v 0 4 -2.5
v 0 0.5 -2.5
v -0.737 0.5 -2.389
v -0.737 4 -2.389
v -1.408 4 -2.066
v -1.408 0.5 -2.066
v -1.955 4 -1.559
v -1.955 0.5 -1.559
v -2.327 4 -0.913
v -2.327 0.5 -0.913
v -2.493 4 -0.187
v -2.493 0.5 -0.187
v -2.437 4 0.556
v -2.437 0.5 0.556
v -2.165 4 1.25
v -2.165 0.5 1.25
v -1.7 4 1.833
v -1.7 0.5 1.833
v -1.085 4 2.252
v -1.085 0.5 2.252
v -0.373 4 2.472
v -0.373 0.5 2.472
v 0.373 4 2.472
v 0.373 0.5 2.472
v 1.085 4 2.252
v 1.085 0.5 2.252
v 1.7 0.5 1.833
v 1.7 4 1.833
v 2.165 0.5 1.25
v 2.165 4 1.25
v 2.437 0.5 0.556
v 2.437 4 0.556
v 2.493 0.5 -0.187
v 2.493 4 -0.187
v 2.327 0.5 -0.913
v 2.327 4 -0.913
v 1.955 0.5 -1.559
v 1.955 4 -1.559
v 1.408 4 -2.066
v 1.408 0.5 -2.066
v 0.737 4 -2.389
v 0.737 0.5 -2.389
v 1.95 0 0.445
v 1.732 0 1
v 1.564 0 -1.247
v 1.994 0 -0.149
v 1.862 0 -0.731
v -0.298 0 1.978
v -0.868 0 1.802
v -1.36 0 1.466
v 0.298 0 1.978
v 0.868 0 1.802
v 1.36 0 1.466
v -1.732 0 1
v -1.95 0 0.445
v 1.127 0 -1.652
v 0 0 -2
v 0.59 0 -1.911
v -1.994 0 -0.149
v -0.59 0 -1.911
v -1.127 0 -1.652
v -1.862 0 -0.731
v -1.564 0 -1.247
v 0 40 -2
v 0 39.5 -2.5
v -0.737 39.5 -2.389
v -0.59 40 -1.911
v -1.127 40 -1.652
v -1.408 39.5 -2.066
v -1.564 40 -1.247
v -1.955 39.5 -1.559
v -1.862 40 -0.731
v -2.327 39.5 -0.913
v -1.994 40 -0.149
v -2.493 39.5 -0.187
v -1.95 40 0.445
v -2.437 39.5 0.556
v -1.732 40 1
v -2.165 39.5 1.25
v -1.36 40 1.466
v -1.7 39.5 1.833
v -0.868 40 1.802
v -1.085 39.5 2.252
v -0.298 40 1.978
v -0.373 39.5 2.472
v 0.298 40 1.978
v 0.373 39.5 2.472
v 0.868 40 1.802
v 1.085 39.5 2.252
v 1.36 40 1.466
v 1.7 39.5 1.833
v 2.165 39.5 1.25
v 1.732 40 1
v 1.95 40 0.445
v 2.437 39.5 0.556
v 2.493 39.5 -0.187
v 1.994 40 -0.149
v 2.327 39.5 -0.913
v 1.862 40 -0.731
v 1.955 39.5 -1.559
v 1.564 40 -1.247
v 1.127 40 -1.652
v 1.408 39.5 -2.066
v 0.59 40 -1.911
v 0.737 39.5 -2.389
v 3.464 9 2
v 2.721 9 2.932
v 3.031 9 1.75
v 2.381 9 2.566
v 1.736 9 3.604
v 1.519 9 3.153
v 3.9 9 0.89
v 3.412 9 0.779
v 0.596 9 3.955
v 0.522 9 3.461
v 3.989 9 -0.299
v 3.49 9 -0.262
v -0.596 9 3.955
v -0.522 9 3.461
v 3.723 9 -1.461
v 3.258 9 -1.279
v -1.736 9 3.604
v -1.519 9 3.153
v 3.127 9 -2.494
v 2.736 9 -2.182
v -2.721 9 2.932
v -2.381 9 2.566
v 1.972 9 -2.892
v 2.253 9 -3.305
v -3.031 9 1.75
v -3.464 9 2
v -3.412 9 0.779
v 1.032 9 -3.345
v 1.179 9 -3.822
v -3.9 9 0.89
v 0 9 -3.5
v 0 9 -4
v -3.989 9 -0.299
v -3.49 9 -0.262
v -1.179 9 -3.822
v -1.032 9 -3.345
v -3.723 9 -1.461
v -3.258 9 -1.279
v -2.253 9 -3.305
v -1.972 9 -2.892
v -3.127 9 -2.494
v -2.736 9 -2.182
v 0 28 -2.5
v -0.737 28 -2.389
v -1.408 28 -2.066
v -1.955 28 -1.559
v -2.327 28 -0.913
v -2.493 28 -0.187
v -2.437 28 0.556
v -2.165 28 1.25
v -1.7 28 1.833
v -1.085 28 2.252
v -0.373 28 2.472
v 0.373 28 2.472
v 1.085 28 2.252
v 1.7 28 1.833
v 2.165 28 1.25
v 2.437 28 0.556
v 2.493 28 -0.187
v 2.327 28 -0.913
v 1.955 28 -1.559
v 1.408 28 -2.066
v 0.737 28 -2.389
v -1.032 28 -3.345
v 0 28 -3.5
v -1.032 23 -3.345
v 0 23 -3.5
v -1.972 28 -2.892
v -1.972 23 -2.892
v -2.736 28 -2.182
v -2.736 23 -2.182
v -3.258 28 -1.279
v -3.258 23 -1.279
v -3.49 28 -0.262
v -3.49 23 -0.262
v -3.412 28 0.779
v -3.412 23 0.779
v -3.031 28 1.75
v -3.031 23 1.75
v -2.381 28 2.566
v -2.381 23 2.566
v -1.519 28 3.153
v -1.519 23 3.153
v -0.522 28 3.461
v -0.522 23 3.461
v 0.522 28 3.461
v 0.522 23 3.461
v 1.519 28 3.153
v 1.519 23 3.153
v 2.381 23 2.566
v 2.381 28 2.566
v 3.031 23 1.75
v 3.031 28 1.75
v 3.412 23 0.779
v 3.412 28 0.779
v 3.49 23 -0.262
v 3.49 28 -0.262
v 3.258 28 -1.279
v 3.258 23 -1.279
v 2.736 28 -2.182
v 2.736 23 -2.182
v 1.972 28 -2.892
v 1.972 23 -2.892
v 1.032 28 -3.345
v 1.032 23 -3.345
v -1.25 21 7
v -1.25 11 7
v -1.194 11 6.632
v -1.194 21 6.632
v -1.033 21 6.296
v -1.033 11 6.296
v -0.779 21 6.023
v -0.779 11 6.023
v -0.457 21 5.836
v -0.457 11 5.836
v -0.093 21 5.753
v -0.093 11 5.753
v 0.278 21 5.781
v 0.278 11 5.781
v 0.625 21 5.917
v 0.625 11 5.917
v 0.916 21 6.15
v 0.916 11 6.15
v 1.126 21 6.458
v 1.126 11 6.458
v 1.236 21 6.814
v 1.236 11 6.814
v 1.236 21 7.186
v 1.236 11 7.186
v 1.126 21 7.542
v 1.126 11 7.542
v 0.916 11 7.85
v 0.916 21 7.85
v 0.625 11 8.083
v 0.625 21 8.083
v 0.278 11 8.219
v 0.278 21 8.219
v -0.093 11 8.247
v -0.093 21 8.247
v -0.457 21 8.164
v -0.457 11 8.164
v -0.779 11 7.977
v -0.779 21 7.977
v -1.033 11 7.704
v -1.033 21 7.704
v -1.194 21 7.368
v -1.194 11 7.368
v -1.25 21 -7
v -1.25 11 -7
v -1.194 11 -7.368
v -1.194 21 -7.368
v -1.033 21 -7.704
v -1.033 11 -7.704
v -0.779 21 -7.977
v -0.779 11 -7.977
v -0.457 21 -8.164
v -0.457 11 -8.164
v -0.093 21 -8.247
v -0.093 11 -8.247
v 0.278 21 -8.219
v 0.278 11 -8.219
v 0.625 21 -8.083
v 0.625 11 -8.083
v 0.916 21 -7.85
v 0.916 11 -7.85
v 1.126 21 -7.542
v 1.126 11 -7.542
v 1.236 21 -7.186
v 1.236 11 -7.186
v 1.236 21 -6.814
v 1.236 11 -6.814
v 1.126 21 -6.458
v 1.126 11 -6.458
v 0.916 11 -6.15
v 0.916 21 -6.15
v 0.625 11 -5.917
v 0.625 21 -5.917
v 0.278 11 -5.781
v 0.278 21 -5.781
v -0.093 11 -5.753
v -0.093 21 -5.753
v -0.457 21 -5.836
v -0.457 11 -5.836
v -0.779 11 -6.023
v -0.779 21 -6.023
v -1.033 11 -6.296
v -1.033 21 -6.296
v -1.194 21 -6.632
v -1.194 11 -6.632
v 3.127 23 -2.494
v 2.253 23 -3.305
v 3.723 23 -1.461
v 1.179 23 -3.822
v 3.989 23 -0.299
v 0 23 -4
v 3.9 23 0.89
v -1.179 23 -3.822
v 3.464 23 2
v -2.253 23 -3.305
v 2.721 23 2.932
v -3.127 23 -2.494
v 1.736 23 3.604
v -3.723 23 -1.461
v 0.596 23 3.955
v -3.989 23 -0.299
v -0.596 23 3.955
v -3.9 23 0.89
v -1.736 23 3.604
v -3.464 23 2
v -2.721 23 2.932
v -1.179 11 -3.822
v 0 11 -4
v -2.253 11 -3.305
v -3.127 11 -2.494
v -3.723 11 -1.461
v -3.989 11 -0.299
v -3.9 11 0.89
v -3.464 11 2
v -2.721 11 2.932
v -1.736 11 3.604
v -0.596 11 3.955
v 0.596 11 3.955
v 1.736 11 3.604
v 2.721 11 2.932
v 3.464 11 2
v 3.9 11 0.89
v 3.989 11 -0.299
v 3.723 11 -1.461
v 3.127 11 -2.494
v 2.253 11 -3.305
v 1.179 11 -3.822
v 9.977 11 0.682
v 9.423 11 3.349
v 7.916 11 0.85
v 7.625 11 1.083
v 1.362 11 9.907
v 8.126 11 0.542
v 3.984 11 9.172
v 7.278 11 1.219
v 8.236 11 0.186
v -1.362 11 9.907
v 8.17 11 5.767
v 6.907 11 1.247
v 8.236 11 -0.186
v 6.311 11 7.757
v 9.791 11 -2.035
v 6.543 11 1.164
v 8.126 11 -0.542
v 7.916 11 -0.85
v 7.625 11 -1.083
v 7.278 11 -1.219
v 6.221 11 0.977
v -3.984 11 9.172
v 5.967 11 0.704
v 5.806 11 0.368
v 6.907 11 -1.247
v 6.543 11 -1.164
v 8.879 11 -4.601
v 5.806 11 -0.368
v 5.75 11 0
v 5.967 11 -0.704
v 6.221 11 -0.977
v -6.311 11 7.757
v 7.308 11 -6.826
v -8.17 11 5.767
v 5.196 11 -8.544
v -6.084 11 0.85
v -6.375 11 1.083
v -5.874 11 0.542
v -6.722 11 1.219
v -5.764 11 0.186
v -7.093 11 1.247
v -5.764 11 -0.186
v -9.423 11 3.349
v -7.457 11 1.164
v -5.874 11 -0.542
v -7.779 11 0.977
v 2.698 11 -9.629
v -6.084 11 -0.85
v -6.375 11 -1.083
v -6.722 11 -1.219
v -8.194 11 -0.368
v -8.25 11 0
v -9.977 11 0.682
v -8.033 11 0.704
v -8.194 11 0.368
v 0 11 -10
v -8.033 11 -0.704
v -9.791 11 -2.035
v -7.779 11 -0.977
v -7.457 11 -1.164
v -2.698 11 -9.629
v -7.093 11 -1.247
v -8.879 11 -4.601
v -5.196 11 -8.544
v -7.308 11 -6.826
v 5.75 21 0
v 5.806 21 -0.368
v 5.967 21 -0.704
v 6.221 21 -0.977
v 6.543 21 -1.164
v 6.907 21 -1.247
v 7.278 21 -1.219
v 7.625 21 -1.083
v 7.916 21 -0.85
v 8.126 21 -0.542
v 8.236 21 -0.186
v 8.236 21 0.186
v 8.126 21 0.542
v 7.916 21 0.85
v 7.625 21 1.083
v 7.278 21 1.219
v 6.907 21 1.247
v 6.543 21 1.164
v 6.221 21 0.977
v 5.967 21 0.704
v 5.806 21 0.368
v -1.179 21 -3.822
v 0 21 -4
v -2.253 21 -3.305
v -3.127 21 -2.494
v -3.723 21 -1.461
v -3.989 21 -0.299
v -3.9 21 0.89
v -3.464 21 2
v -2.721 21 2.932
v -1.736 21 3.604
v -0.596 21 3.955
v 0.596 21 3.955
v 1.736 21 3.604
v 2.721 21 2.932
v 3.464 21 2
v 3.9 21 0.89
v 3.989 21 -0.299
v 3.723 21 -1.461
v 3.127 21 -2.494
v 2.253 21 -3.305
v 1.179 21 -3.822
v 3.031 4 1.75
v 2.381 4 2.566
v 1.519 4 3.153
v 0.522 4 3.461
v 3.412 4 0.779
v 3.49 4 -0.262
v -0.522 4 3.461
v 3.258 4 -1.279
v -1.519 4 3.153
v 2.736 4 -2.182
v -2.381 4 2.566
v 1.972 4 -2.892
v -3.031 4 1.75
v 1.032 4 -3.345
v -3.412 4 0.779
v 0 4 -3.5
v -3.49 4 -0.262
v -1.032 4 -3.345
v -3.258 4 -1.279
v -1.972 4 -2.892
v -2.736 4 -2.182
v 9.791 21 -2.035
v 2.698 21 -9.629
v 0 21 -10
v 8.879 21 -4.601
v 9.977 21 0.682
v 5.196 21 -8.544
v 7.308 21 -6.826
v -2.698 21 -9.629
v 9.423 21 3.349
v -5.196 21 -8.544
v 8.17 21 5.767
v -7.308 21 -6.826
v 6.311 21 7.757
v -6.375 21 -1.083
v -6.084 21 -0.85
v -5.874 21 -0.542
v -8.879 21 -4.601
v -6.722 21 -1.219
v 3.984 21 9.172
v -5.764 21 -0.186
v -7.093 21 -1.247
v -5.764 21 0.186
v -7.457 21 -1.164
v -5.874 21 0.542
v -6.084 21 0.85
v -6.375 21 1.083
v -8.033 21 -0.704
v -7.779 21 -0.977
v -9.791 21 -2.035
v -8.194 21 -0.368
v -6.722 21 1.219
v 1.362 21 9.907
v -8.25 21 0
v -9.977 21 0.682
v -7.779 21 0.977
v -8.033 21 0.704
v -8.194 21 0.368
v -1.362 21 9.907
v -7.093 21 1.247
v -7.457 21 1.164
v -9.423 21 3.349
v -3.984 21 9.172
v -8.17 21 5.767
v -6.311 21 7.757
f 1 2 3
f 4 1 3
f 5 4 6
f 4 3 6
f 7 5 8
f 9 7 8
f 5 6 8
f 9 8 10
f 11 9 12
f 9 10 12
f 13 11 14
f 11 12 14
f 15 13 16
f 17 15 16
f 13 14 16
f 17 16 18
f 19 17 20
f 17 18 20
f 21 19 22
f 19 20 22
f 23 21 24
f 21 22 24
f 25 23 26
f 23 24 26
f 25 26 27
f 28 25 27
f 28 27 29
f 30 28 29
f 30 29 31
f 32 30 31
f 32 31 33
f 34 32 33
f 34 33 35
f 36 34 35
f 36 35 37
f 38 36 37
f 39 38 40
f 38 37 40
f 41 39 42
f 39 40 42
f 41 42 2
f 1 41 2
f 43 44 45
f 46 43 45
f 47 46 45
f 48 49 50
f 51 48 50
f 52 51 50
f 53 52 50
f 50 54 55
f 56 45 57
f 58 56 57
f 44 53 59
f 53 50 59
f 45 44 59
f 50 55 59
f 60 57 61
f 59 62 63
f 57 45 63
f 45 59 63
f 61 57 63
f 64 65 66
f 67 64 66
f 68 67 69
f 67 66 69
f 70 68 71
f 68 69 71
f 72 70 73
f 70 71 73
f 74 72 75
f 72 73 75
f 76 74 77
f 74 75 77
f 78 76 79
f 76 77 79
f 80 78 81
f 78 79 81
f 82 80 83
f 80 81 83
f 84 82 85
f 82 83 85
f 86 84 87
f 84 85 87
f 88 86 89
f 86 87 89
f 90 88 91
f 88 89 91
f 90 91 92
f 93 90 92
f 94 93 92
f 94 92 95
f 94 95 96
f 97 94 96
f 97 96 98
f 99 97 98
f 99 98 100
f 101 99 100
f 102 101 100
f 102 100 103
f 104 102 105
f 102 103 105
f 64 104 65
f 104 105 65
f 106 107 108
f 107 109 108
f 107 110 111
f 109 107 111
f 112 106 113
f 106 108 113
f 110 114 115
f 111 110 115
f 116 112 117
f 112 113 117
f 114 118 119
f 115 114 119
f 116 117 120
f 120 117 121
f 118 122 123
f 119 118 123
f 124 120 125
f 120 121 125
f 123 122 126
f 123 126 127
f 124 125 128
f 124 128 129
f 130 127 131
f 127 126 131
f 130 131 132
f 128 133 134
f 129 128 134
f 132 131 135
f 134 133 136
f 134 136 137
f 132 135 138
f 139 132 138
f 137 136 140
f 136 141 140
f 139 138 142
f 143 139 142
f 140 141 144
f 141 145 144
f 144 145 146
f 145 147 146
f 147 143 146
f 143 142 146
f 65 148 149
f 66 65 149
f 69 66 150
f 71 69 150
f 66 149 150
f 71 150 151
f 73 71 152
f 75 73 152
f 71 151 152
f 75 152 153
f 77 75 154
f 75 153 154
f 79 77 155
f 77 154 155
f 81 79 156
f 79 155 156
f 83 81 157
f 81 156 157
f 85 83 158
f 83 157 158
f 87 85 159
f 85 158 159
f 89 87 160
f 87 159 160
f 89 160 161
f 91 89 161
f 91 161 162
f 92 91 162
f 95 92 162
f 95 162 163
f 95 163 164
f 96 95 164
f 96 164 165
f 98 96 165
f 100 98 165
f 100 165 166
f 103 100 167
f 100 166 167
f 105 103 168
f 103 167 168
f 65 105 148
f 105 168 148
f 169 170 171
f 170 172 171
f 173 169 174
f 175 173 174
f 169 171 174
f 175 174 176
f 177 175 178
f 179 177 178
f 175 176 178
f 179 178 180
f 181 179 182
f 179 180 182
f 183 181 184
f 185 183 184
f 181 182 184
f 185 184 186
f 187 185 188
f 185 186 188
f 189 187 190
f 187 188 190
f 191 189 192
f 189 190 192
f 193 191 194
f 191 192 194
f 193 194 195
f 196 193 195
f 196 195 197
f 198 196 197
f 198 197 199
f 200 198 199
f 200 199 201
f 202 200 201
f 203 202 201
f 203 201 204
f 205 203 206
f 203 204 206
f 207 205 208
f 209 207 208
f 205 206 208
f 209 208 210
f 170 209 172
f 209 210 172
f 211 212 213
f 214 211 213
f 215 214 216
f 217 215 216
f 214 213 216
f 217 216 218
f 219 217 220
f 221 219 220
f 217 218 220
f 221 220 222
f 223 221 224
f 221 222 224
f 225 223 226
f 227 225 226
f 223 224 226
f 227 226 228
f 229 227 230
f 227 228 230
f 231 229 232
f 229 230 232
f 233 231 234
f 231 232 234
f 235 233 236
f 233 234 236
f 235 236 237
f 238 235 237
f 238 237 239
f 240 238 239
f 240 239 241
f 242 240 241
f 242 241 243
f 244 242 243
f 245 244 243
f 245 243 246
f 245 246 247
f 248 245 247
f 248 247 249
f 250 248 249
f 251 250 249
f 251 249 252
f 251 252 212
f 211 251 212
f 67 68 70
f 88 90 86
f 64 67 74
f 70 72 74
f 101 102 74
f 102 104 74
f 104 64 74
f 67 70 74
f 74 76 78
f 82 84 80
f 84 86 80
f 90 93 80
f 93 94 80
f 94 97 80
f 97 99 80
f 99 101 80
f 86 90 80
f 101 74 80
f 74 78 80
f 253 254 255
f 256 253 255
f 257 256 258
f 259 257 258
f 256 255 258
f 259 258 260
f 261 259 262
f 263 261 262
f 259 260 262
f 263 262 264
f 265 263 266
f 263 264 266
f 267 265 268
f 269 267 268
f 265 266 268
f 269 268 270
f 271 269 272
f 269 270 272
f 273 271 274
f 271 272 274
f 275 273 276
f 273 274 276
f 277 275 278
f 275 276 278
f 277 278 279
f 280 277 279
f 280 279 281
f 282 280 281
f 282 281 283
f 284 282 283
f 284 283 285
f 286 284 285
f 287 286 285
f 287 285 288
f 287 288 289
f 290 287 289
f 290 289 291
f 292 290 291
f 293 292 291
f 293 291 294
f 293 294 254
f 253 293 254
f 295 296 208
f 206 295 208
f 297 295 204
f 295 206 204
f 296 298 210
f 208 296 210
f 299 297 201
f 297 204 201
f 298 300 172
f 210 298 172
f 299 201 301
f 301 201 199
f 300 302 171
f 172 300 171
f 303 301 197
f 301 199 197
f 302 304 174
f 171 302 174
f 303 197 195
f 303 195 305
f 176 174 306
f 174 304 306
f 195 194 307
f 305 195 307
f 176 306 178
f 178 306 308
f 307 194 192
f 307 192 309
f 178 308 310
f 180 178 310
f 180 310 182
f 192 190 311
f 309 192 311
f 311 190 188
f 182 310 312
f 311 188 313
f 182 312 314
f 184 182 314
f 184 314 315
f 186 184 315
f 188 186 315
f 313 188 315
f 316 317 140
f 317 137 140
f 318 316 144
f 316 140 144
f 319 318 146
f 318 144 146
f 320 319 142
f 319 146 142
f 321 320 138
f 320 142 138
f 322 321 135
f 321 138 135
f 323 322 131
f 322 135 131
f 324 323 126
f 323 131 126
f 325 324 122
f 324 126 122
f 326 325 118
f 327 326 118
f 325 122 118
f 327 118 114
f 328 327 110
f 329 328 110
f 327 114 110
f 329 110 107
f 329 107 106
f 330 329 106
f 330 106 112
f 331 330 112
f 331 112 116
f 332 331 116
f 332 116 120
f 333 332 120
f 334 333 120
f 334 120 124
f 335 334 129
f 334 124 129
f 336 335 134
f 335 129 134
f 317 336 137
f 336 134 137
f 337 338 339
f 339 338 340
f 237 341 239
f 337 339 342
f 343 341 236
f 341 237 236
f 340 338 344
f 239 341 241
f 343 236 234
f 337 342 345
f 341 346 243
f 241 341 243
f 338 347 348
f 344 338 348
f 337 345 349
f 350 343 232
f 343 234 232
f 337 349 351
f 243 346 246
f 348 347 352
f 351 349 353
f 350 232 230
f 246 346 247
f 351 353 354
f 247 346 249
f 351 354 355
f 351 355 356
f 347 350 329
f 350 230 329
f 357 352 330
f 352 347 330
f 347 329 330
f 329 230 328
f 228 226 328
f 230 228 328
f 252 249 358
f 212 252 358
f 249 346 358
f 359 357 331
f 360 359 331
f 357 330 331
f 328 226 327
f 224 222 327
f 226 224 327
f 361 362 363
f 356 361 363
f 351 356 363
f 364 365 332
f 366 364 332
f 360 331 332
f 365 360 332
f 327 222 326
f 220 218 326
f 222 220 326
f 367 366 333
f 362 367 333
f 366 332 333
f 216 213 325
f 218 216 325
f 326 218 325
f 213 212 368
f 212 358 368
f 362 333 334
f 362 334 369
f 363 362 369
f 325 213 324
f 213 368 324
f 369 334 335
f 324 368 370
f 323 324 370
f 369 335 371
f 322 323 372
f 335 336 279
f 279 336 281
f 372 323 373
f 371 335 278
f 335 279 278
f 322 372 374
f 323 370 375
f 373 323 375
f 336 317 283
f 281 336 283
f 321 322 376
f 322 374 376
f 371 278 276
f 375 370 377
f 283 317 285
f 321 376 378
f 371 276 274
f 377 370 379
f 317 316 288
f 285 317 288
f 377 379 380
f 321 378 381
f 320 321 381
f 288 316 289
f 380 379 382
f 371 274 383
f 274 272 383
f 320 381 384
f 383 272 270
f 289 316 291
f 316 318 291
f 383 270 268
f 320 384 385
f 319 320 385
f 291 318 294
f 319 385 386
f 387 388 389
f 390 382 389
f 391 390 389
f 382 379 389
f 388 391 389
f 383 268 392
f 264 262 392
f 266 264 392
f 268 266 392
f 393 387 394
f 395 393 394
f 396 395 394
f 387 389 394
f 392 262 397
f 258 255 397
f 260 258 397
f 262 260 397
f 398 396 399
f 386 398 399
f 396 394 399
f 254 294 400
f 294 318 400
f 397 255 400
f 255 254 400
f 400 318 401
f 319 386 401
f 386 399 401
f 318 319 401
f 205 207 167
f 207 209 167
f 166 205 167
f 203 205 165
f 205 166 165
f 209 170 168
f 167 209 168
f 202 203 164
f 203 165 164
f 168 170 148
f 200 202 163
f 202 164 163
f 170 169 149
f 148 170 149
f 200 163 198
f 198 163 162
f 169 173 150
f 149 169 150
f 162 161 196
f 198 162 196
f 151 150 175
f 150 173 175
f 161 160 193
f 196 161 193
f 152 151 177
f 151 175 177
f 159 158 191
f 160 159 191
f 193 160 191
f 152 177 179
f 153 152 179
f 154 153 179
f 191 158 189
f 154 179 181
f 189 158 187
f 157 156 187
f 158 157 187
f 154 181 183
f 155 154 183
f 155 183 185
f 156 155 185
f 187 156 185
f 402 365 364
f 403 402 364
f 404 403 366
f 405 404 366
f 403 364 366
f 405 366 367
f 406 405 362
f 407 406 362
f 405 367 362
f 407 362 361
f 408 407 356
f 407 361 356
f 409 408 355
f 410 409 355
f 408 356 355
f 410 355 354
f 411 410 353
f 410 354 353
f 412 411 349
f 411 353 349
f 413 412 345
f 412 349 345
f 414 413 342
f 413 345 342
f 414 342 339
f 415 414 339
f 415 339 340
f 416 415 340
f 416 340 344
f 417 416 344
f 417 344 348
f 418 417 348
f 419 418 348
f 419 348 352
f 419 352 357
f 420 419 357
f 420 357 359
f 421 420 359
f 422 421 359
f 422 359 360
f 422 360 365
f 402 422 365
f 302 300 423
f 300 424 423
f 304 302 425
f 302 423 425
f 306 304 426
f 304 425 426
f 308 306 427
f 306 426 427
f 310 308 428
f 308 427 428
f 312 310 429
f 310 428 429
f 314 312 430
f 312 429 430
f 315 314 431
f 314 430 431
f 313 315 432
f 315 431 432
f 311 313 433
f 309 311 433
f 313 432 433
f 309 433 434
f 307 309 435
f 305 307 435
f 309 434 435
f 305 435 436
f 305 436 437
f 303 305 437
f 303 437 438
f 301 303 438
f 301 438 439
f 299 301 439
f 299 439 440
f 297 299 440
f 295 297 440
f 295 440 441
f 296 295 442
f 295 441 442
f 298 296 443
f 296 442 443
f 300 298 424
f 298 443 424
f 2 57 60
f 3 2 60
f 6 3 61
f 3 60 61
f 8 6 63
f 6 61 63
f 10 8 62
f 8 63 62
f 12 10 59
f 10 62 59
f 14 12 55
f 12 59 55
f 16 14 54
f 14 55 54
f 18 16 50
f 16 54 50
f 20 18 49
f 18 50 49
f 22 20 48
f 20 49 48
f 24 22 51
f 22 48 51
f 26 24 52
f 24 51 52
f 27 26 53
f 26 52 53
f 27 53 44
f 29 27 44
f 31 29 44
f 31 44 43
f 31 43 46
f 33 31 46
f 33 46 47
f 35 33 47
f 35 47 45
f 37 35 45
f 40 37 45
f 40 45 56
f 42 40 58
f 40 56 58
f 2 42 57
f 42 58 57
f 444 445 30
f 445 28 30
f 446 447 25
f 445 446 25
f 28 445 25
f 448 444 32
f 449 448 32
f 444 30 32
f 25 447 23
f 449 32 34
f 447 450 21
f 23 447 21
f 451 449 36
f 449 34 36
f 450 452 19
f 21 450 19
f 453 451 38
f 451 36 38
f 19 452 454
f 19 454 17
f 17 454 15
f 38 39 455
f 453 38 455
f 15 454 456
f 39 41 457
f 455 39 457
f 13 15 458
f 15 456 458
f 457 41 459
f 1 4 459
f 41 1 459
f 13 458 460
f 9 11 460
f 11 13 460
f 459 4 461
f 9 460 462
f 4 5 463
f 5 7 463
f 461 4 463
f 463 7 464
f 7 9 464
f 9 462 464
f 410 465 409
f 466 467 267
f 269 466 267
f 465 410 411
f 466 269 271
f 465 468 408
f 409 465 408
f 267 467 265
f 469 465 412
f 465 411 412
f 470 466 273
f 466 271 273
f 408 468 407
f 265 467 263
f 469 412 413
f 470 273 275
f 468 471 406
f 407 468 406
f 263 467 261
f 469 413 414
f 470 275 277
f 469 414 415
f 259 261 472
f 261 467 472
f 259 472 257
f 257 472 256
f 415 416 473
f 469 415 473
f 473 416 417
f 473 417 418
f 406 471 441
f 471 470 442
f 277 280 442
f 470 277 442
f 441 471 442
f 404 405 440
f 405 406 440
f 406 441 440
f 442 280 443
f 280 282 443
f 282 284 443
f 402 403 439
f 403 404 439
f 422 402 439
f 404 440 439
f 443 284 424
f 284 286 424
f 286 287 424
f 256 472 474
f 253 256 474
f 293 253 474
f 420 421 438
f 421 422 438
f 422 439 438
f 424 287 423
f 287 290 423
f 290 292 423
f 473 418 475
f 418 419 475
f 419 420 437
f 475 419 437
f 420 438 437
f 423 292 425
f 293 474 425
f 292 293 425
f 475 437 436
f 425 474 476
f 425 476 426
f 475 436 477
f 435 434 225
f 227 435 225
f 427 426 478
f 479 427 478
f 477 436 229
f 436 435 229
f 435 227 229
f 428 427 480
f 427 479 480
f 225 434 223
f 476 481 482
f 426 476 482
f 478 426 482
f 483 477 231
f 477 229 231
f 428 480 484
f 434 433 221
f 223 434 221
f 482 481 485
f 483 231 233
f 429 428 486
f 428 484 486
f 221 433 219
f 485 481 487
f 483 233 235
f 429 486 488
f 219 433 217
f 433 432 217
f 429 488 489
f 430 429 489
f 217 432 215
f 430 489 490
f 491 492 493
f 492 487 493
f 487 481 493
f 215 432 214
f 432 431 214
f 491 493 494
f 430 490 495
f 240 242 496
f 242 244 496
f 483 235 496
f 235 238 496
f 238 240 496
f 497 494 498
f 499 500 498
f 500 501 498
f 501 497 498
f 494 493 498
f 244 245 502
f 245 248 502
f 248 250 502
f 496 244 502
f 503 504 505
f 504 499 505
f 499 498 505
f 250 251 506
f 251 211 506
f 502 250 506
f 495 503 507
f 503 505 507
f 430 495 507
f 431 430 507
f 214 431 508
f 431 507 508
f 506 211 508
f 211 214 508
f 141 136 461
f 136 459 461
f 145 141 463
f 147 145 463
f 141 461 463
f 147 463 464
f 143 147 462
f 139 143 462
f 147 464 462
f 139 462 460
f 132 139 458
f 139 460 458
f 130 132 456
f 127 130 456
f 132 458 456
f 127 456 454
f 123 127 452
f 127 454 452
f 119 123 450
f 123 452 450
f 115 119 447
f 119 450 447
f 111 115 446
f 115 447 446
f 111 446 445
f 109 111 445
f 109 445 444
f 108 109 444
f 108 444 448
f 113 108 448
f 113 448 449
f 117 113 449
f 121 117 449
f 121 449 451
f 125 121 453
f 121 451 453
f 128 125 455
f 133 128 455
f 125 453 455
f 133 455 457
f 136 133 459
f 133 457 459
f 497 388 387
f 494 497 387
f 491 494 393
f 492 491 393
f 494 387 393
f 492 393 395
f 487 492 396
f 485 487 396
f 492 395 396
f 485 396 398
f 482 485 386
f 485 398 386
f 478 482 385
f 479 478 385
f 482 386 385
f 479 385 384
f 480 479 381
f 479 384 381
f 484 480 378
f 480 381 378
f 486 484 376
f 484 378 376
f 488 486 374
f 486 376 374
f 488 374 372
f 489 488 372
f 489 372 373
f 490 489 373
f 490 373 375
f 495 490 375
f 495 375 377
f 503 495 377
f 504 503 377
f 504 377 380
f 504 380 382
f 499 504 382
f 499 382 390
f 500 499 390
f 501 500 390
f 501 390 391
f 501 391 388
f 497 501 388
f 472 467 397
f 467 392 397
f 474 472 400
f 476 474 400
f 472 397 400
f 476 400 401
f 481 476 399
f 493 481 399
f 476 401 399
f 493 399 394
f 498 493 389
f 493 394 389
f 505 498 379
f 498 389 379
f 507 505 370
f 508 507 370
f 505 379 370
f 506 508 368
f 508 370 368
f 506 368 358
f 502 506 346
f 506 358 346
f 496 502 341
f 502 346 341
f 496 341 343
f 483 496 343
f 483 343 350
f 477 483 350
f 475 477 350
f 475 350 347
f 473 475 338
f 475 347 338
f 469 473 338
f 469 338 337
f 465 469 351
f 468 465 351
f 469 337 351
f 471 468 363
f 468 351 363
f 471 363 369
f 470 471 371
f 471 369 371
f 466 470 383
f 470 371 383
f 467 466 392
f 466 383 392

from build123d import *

# Parameters (mm, degrees)
HOLE_WIZARD_M3_1_D = 2.5
CHAMFER_1_SIZE     = 0.5


with BuildPart() as part:
    # 草图1 → 旋转1 (revolve)
    with BuildSketch(Plane.XY, mode=Mode.PRIVATE) as revolve_1_sk:
        Polygon((0, 0), (0, 40), (2.5, 40), (2.5, 28), (3.5, 28), (3.5, 23), (4, 23), (4, 21), (10, 21), (10, 11), (4, 11), (4, 9), (3.5, 9), (3.5, 4), (2.5, 4), (2.5, 0), align=None)
    revolve(revolve_1_sk.sketch.rotate(Axis((0, 0, 0), (0, 1, 0)), 90), axis=Axis((0, 0, 0), (0, 1, 0)))

    # M3 螺纹孔1 (through all)
    with Locations(Plane(origin=(0, 21, 0), x_dir=(1, 0, 0), z_dir=(0, 1, 0))):
        with Locations((0, 7), (7, 0), (0, -7), (-7, 0)):
            Hole(HOLE_WIZARD_M3_1_D / 2)

    # 倒角1
    chamfer_1_edges = [part.edges().sort_by_distance(p)[0] for p in [
        (0, 0, 2.5),
        (0, 40, 2.5),
    ]]
    chamfer(chamfer_1_edges, length=CHAMFER_1_SIZE)


solid = part.part
